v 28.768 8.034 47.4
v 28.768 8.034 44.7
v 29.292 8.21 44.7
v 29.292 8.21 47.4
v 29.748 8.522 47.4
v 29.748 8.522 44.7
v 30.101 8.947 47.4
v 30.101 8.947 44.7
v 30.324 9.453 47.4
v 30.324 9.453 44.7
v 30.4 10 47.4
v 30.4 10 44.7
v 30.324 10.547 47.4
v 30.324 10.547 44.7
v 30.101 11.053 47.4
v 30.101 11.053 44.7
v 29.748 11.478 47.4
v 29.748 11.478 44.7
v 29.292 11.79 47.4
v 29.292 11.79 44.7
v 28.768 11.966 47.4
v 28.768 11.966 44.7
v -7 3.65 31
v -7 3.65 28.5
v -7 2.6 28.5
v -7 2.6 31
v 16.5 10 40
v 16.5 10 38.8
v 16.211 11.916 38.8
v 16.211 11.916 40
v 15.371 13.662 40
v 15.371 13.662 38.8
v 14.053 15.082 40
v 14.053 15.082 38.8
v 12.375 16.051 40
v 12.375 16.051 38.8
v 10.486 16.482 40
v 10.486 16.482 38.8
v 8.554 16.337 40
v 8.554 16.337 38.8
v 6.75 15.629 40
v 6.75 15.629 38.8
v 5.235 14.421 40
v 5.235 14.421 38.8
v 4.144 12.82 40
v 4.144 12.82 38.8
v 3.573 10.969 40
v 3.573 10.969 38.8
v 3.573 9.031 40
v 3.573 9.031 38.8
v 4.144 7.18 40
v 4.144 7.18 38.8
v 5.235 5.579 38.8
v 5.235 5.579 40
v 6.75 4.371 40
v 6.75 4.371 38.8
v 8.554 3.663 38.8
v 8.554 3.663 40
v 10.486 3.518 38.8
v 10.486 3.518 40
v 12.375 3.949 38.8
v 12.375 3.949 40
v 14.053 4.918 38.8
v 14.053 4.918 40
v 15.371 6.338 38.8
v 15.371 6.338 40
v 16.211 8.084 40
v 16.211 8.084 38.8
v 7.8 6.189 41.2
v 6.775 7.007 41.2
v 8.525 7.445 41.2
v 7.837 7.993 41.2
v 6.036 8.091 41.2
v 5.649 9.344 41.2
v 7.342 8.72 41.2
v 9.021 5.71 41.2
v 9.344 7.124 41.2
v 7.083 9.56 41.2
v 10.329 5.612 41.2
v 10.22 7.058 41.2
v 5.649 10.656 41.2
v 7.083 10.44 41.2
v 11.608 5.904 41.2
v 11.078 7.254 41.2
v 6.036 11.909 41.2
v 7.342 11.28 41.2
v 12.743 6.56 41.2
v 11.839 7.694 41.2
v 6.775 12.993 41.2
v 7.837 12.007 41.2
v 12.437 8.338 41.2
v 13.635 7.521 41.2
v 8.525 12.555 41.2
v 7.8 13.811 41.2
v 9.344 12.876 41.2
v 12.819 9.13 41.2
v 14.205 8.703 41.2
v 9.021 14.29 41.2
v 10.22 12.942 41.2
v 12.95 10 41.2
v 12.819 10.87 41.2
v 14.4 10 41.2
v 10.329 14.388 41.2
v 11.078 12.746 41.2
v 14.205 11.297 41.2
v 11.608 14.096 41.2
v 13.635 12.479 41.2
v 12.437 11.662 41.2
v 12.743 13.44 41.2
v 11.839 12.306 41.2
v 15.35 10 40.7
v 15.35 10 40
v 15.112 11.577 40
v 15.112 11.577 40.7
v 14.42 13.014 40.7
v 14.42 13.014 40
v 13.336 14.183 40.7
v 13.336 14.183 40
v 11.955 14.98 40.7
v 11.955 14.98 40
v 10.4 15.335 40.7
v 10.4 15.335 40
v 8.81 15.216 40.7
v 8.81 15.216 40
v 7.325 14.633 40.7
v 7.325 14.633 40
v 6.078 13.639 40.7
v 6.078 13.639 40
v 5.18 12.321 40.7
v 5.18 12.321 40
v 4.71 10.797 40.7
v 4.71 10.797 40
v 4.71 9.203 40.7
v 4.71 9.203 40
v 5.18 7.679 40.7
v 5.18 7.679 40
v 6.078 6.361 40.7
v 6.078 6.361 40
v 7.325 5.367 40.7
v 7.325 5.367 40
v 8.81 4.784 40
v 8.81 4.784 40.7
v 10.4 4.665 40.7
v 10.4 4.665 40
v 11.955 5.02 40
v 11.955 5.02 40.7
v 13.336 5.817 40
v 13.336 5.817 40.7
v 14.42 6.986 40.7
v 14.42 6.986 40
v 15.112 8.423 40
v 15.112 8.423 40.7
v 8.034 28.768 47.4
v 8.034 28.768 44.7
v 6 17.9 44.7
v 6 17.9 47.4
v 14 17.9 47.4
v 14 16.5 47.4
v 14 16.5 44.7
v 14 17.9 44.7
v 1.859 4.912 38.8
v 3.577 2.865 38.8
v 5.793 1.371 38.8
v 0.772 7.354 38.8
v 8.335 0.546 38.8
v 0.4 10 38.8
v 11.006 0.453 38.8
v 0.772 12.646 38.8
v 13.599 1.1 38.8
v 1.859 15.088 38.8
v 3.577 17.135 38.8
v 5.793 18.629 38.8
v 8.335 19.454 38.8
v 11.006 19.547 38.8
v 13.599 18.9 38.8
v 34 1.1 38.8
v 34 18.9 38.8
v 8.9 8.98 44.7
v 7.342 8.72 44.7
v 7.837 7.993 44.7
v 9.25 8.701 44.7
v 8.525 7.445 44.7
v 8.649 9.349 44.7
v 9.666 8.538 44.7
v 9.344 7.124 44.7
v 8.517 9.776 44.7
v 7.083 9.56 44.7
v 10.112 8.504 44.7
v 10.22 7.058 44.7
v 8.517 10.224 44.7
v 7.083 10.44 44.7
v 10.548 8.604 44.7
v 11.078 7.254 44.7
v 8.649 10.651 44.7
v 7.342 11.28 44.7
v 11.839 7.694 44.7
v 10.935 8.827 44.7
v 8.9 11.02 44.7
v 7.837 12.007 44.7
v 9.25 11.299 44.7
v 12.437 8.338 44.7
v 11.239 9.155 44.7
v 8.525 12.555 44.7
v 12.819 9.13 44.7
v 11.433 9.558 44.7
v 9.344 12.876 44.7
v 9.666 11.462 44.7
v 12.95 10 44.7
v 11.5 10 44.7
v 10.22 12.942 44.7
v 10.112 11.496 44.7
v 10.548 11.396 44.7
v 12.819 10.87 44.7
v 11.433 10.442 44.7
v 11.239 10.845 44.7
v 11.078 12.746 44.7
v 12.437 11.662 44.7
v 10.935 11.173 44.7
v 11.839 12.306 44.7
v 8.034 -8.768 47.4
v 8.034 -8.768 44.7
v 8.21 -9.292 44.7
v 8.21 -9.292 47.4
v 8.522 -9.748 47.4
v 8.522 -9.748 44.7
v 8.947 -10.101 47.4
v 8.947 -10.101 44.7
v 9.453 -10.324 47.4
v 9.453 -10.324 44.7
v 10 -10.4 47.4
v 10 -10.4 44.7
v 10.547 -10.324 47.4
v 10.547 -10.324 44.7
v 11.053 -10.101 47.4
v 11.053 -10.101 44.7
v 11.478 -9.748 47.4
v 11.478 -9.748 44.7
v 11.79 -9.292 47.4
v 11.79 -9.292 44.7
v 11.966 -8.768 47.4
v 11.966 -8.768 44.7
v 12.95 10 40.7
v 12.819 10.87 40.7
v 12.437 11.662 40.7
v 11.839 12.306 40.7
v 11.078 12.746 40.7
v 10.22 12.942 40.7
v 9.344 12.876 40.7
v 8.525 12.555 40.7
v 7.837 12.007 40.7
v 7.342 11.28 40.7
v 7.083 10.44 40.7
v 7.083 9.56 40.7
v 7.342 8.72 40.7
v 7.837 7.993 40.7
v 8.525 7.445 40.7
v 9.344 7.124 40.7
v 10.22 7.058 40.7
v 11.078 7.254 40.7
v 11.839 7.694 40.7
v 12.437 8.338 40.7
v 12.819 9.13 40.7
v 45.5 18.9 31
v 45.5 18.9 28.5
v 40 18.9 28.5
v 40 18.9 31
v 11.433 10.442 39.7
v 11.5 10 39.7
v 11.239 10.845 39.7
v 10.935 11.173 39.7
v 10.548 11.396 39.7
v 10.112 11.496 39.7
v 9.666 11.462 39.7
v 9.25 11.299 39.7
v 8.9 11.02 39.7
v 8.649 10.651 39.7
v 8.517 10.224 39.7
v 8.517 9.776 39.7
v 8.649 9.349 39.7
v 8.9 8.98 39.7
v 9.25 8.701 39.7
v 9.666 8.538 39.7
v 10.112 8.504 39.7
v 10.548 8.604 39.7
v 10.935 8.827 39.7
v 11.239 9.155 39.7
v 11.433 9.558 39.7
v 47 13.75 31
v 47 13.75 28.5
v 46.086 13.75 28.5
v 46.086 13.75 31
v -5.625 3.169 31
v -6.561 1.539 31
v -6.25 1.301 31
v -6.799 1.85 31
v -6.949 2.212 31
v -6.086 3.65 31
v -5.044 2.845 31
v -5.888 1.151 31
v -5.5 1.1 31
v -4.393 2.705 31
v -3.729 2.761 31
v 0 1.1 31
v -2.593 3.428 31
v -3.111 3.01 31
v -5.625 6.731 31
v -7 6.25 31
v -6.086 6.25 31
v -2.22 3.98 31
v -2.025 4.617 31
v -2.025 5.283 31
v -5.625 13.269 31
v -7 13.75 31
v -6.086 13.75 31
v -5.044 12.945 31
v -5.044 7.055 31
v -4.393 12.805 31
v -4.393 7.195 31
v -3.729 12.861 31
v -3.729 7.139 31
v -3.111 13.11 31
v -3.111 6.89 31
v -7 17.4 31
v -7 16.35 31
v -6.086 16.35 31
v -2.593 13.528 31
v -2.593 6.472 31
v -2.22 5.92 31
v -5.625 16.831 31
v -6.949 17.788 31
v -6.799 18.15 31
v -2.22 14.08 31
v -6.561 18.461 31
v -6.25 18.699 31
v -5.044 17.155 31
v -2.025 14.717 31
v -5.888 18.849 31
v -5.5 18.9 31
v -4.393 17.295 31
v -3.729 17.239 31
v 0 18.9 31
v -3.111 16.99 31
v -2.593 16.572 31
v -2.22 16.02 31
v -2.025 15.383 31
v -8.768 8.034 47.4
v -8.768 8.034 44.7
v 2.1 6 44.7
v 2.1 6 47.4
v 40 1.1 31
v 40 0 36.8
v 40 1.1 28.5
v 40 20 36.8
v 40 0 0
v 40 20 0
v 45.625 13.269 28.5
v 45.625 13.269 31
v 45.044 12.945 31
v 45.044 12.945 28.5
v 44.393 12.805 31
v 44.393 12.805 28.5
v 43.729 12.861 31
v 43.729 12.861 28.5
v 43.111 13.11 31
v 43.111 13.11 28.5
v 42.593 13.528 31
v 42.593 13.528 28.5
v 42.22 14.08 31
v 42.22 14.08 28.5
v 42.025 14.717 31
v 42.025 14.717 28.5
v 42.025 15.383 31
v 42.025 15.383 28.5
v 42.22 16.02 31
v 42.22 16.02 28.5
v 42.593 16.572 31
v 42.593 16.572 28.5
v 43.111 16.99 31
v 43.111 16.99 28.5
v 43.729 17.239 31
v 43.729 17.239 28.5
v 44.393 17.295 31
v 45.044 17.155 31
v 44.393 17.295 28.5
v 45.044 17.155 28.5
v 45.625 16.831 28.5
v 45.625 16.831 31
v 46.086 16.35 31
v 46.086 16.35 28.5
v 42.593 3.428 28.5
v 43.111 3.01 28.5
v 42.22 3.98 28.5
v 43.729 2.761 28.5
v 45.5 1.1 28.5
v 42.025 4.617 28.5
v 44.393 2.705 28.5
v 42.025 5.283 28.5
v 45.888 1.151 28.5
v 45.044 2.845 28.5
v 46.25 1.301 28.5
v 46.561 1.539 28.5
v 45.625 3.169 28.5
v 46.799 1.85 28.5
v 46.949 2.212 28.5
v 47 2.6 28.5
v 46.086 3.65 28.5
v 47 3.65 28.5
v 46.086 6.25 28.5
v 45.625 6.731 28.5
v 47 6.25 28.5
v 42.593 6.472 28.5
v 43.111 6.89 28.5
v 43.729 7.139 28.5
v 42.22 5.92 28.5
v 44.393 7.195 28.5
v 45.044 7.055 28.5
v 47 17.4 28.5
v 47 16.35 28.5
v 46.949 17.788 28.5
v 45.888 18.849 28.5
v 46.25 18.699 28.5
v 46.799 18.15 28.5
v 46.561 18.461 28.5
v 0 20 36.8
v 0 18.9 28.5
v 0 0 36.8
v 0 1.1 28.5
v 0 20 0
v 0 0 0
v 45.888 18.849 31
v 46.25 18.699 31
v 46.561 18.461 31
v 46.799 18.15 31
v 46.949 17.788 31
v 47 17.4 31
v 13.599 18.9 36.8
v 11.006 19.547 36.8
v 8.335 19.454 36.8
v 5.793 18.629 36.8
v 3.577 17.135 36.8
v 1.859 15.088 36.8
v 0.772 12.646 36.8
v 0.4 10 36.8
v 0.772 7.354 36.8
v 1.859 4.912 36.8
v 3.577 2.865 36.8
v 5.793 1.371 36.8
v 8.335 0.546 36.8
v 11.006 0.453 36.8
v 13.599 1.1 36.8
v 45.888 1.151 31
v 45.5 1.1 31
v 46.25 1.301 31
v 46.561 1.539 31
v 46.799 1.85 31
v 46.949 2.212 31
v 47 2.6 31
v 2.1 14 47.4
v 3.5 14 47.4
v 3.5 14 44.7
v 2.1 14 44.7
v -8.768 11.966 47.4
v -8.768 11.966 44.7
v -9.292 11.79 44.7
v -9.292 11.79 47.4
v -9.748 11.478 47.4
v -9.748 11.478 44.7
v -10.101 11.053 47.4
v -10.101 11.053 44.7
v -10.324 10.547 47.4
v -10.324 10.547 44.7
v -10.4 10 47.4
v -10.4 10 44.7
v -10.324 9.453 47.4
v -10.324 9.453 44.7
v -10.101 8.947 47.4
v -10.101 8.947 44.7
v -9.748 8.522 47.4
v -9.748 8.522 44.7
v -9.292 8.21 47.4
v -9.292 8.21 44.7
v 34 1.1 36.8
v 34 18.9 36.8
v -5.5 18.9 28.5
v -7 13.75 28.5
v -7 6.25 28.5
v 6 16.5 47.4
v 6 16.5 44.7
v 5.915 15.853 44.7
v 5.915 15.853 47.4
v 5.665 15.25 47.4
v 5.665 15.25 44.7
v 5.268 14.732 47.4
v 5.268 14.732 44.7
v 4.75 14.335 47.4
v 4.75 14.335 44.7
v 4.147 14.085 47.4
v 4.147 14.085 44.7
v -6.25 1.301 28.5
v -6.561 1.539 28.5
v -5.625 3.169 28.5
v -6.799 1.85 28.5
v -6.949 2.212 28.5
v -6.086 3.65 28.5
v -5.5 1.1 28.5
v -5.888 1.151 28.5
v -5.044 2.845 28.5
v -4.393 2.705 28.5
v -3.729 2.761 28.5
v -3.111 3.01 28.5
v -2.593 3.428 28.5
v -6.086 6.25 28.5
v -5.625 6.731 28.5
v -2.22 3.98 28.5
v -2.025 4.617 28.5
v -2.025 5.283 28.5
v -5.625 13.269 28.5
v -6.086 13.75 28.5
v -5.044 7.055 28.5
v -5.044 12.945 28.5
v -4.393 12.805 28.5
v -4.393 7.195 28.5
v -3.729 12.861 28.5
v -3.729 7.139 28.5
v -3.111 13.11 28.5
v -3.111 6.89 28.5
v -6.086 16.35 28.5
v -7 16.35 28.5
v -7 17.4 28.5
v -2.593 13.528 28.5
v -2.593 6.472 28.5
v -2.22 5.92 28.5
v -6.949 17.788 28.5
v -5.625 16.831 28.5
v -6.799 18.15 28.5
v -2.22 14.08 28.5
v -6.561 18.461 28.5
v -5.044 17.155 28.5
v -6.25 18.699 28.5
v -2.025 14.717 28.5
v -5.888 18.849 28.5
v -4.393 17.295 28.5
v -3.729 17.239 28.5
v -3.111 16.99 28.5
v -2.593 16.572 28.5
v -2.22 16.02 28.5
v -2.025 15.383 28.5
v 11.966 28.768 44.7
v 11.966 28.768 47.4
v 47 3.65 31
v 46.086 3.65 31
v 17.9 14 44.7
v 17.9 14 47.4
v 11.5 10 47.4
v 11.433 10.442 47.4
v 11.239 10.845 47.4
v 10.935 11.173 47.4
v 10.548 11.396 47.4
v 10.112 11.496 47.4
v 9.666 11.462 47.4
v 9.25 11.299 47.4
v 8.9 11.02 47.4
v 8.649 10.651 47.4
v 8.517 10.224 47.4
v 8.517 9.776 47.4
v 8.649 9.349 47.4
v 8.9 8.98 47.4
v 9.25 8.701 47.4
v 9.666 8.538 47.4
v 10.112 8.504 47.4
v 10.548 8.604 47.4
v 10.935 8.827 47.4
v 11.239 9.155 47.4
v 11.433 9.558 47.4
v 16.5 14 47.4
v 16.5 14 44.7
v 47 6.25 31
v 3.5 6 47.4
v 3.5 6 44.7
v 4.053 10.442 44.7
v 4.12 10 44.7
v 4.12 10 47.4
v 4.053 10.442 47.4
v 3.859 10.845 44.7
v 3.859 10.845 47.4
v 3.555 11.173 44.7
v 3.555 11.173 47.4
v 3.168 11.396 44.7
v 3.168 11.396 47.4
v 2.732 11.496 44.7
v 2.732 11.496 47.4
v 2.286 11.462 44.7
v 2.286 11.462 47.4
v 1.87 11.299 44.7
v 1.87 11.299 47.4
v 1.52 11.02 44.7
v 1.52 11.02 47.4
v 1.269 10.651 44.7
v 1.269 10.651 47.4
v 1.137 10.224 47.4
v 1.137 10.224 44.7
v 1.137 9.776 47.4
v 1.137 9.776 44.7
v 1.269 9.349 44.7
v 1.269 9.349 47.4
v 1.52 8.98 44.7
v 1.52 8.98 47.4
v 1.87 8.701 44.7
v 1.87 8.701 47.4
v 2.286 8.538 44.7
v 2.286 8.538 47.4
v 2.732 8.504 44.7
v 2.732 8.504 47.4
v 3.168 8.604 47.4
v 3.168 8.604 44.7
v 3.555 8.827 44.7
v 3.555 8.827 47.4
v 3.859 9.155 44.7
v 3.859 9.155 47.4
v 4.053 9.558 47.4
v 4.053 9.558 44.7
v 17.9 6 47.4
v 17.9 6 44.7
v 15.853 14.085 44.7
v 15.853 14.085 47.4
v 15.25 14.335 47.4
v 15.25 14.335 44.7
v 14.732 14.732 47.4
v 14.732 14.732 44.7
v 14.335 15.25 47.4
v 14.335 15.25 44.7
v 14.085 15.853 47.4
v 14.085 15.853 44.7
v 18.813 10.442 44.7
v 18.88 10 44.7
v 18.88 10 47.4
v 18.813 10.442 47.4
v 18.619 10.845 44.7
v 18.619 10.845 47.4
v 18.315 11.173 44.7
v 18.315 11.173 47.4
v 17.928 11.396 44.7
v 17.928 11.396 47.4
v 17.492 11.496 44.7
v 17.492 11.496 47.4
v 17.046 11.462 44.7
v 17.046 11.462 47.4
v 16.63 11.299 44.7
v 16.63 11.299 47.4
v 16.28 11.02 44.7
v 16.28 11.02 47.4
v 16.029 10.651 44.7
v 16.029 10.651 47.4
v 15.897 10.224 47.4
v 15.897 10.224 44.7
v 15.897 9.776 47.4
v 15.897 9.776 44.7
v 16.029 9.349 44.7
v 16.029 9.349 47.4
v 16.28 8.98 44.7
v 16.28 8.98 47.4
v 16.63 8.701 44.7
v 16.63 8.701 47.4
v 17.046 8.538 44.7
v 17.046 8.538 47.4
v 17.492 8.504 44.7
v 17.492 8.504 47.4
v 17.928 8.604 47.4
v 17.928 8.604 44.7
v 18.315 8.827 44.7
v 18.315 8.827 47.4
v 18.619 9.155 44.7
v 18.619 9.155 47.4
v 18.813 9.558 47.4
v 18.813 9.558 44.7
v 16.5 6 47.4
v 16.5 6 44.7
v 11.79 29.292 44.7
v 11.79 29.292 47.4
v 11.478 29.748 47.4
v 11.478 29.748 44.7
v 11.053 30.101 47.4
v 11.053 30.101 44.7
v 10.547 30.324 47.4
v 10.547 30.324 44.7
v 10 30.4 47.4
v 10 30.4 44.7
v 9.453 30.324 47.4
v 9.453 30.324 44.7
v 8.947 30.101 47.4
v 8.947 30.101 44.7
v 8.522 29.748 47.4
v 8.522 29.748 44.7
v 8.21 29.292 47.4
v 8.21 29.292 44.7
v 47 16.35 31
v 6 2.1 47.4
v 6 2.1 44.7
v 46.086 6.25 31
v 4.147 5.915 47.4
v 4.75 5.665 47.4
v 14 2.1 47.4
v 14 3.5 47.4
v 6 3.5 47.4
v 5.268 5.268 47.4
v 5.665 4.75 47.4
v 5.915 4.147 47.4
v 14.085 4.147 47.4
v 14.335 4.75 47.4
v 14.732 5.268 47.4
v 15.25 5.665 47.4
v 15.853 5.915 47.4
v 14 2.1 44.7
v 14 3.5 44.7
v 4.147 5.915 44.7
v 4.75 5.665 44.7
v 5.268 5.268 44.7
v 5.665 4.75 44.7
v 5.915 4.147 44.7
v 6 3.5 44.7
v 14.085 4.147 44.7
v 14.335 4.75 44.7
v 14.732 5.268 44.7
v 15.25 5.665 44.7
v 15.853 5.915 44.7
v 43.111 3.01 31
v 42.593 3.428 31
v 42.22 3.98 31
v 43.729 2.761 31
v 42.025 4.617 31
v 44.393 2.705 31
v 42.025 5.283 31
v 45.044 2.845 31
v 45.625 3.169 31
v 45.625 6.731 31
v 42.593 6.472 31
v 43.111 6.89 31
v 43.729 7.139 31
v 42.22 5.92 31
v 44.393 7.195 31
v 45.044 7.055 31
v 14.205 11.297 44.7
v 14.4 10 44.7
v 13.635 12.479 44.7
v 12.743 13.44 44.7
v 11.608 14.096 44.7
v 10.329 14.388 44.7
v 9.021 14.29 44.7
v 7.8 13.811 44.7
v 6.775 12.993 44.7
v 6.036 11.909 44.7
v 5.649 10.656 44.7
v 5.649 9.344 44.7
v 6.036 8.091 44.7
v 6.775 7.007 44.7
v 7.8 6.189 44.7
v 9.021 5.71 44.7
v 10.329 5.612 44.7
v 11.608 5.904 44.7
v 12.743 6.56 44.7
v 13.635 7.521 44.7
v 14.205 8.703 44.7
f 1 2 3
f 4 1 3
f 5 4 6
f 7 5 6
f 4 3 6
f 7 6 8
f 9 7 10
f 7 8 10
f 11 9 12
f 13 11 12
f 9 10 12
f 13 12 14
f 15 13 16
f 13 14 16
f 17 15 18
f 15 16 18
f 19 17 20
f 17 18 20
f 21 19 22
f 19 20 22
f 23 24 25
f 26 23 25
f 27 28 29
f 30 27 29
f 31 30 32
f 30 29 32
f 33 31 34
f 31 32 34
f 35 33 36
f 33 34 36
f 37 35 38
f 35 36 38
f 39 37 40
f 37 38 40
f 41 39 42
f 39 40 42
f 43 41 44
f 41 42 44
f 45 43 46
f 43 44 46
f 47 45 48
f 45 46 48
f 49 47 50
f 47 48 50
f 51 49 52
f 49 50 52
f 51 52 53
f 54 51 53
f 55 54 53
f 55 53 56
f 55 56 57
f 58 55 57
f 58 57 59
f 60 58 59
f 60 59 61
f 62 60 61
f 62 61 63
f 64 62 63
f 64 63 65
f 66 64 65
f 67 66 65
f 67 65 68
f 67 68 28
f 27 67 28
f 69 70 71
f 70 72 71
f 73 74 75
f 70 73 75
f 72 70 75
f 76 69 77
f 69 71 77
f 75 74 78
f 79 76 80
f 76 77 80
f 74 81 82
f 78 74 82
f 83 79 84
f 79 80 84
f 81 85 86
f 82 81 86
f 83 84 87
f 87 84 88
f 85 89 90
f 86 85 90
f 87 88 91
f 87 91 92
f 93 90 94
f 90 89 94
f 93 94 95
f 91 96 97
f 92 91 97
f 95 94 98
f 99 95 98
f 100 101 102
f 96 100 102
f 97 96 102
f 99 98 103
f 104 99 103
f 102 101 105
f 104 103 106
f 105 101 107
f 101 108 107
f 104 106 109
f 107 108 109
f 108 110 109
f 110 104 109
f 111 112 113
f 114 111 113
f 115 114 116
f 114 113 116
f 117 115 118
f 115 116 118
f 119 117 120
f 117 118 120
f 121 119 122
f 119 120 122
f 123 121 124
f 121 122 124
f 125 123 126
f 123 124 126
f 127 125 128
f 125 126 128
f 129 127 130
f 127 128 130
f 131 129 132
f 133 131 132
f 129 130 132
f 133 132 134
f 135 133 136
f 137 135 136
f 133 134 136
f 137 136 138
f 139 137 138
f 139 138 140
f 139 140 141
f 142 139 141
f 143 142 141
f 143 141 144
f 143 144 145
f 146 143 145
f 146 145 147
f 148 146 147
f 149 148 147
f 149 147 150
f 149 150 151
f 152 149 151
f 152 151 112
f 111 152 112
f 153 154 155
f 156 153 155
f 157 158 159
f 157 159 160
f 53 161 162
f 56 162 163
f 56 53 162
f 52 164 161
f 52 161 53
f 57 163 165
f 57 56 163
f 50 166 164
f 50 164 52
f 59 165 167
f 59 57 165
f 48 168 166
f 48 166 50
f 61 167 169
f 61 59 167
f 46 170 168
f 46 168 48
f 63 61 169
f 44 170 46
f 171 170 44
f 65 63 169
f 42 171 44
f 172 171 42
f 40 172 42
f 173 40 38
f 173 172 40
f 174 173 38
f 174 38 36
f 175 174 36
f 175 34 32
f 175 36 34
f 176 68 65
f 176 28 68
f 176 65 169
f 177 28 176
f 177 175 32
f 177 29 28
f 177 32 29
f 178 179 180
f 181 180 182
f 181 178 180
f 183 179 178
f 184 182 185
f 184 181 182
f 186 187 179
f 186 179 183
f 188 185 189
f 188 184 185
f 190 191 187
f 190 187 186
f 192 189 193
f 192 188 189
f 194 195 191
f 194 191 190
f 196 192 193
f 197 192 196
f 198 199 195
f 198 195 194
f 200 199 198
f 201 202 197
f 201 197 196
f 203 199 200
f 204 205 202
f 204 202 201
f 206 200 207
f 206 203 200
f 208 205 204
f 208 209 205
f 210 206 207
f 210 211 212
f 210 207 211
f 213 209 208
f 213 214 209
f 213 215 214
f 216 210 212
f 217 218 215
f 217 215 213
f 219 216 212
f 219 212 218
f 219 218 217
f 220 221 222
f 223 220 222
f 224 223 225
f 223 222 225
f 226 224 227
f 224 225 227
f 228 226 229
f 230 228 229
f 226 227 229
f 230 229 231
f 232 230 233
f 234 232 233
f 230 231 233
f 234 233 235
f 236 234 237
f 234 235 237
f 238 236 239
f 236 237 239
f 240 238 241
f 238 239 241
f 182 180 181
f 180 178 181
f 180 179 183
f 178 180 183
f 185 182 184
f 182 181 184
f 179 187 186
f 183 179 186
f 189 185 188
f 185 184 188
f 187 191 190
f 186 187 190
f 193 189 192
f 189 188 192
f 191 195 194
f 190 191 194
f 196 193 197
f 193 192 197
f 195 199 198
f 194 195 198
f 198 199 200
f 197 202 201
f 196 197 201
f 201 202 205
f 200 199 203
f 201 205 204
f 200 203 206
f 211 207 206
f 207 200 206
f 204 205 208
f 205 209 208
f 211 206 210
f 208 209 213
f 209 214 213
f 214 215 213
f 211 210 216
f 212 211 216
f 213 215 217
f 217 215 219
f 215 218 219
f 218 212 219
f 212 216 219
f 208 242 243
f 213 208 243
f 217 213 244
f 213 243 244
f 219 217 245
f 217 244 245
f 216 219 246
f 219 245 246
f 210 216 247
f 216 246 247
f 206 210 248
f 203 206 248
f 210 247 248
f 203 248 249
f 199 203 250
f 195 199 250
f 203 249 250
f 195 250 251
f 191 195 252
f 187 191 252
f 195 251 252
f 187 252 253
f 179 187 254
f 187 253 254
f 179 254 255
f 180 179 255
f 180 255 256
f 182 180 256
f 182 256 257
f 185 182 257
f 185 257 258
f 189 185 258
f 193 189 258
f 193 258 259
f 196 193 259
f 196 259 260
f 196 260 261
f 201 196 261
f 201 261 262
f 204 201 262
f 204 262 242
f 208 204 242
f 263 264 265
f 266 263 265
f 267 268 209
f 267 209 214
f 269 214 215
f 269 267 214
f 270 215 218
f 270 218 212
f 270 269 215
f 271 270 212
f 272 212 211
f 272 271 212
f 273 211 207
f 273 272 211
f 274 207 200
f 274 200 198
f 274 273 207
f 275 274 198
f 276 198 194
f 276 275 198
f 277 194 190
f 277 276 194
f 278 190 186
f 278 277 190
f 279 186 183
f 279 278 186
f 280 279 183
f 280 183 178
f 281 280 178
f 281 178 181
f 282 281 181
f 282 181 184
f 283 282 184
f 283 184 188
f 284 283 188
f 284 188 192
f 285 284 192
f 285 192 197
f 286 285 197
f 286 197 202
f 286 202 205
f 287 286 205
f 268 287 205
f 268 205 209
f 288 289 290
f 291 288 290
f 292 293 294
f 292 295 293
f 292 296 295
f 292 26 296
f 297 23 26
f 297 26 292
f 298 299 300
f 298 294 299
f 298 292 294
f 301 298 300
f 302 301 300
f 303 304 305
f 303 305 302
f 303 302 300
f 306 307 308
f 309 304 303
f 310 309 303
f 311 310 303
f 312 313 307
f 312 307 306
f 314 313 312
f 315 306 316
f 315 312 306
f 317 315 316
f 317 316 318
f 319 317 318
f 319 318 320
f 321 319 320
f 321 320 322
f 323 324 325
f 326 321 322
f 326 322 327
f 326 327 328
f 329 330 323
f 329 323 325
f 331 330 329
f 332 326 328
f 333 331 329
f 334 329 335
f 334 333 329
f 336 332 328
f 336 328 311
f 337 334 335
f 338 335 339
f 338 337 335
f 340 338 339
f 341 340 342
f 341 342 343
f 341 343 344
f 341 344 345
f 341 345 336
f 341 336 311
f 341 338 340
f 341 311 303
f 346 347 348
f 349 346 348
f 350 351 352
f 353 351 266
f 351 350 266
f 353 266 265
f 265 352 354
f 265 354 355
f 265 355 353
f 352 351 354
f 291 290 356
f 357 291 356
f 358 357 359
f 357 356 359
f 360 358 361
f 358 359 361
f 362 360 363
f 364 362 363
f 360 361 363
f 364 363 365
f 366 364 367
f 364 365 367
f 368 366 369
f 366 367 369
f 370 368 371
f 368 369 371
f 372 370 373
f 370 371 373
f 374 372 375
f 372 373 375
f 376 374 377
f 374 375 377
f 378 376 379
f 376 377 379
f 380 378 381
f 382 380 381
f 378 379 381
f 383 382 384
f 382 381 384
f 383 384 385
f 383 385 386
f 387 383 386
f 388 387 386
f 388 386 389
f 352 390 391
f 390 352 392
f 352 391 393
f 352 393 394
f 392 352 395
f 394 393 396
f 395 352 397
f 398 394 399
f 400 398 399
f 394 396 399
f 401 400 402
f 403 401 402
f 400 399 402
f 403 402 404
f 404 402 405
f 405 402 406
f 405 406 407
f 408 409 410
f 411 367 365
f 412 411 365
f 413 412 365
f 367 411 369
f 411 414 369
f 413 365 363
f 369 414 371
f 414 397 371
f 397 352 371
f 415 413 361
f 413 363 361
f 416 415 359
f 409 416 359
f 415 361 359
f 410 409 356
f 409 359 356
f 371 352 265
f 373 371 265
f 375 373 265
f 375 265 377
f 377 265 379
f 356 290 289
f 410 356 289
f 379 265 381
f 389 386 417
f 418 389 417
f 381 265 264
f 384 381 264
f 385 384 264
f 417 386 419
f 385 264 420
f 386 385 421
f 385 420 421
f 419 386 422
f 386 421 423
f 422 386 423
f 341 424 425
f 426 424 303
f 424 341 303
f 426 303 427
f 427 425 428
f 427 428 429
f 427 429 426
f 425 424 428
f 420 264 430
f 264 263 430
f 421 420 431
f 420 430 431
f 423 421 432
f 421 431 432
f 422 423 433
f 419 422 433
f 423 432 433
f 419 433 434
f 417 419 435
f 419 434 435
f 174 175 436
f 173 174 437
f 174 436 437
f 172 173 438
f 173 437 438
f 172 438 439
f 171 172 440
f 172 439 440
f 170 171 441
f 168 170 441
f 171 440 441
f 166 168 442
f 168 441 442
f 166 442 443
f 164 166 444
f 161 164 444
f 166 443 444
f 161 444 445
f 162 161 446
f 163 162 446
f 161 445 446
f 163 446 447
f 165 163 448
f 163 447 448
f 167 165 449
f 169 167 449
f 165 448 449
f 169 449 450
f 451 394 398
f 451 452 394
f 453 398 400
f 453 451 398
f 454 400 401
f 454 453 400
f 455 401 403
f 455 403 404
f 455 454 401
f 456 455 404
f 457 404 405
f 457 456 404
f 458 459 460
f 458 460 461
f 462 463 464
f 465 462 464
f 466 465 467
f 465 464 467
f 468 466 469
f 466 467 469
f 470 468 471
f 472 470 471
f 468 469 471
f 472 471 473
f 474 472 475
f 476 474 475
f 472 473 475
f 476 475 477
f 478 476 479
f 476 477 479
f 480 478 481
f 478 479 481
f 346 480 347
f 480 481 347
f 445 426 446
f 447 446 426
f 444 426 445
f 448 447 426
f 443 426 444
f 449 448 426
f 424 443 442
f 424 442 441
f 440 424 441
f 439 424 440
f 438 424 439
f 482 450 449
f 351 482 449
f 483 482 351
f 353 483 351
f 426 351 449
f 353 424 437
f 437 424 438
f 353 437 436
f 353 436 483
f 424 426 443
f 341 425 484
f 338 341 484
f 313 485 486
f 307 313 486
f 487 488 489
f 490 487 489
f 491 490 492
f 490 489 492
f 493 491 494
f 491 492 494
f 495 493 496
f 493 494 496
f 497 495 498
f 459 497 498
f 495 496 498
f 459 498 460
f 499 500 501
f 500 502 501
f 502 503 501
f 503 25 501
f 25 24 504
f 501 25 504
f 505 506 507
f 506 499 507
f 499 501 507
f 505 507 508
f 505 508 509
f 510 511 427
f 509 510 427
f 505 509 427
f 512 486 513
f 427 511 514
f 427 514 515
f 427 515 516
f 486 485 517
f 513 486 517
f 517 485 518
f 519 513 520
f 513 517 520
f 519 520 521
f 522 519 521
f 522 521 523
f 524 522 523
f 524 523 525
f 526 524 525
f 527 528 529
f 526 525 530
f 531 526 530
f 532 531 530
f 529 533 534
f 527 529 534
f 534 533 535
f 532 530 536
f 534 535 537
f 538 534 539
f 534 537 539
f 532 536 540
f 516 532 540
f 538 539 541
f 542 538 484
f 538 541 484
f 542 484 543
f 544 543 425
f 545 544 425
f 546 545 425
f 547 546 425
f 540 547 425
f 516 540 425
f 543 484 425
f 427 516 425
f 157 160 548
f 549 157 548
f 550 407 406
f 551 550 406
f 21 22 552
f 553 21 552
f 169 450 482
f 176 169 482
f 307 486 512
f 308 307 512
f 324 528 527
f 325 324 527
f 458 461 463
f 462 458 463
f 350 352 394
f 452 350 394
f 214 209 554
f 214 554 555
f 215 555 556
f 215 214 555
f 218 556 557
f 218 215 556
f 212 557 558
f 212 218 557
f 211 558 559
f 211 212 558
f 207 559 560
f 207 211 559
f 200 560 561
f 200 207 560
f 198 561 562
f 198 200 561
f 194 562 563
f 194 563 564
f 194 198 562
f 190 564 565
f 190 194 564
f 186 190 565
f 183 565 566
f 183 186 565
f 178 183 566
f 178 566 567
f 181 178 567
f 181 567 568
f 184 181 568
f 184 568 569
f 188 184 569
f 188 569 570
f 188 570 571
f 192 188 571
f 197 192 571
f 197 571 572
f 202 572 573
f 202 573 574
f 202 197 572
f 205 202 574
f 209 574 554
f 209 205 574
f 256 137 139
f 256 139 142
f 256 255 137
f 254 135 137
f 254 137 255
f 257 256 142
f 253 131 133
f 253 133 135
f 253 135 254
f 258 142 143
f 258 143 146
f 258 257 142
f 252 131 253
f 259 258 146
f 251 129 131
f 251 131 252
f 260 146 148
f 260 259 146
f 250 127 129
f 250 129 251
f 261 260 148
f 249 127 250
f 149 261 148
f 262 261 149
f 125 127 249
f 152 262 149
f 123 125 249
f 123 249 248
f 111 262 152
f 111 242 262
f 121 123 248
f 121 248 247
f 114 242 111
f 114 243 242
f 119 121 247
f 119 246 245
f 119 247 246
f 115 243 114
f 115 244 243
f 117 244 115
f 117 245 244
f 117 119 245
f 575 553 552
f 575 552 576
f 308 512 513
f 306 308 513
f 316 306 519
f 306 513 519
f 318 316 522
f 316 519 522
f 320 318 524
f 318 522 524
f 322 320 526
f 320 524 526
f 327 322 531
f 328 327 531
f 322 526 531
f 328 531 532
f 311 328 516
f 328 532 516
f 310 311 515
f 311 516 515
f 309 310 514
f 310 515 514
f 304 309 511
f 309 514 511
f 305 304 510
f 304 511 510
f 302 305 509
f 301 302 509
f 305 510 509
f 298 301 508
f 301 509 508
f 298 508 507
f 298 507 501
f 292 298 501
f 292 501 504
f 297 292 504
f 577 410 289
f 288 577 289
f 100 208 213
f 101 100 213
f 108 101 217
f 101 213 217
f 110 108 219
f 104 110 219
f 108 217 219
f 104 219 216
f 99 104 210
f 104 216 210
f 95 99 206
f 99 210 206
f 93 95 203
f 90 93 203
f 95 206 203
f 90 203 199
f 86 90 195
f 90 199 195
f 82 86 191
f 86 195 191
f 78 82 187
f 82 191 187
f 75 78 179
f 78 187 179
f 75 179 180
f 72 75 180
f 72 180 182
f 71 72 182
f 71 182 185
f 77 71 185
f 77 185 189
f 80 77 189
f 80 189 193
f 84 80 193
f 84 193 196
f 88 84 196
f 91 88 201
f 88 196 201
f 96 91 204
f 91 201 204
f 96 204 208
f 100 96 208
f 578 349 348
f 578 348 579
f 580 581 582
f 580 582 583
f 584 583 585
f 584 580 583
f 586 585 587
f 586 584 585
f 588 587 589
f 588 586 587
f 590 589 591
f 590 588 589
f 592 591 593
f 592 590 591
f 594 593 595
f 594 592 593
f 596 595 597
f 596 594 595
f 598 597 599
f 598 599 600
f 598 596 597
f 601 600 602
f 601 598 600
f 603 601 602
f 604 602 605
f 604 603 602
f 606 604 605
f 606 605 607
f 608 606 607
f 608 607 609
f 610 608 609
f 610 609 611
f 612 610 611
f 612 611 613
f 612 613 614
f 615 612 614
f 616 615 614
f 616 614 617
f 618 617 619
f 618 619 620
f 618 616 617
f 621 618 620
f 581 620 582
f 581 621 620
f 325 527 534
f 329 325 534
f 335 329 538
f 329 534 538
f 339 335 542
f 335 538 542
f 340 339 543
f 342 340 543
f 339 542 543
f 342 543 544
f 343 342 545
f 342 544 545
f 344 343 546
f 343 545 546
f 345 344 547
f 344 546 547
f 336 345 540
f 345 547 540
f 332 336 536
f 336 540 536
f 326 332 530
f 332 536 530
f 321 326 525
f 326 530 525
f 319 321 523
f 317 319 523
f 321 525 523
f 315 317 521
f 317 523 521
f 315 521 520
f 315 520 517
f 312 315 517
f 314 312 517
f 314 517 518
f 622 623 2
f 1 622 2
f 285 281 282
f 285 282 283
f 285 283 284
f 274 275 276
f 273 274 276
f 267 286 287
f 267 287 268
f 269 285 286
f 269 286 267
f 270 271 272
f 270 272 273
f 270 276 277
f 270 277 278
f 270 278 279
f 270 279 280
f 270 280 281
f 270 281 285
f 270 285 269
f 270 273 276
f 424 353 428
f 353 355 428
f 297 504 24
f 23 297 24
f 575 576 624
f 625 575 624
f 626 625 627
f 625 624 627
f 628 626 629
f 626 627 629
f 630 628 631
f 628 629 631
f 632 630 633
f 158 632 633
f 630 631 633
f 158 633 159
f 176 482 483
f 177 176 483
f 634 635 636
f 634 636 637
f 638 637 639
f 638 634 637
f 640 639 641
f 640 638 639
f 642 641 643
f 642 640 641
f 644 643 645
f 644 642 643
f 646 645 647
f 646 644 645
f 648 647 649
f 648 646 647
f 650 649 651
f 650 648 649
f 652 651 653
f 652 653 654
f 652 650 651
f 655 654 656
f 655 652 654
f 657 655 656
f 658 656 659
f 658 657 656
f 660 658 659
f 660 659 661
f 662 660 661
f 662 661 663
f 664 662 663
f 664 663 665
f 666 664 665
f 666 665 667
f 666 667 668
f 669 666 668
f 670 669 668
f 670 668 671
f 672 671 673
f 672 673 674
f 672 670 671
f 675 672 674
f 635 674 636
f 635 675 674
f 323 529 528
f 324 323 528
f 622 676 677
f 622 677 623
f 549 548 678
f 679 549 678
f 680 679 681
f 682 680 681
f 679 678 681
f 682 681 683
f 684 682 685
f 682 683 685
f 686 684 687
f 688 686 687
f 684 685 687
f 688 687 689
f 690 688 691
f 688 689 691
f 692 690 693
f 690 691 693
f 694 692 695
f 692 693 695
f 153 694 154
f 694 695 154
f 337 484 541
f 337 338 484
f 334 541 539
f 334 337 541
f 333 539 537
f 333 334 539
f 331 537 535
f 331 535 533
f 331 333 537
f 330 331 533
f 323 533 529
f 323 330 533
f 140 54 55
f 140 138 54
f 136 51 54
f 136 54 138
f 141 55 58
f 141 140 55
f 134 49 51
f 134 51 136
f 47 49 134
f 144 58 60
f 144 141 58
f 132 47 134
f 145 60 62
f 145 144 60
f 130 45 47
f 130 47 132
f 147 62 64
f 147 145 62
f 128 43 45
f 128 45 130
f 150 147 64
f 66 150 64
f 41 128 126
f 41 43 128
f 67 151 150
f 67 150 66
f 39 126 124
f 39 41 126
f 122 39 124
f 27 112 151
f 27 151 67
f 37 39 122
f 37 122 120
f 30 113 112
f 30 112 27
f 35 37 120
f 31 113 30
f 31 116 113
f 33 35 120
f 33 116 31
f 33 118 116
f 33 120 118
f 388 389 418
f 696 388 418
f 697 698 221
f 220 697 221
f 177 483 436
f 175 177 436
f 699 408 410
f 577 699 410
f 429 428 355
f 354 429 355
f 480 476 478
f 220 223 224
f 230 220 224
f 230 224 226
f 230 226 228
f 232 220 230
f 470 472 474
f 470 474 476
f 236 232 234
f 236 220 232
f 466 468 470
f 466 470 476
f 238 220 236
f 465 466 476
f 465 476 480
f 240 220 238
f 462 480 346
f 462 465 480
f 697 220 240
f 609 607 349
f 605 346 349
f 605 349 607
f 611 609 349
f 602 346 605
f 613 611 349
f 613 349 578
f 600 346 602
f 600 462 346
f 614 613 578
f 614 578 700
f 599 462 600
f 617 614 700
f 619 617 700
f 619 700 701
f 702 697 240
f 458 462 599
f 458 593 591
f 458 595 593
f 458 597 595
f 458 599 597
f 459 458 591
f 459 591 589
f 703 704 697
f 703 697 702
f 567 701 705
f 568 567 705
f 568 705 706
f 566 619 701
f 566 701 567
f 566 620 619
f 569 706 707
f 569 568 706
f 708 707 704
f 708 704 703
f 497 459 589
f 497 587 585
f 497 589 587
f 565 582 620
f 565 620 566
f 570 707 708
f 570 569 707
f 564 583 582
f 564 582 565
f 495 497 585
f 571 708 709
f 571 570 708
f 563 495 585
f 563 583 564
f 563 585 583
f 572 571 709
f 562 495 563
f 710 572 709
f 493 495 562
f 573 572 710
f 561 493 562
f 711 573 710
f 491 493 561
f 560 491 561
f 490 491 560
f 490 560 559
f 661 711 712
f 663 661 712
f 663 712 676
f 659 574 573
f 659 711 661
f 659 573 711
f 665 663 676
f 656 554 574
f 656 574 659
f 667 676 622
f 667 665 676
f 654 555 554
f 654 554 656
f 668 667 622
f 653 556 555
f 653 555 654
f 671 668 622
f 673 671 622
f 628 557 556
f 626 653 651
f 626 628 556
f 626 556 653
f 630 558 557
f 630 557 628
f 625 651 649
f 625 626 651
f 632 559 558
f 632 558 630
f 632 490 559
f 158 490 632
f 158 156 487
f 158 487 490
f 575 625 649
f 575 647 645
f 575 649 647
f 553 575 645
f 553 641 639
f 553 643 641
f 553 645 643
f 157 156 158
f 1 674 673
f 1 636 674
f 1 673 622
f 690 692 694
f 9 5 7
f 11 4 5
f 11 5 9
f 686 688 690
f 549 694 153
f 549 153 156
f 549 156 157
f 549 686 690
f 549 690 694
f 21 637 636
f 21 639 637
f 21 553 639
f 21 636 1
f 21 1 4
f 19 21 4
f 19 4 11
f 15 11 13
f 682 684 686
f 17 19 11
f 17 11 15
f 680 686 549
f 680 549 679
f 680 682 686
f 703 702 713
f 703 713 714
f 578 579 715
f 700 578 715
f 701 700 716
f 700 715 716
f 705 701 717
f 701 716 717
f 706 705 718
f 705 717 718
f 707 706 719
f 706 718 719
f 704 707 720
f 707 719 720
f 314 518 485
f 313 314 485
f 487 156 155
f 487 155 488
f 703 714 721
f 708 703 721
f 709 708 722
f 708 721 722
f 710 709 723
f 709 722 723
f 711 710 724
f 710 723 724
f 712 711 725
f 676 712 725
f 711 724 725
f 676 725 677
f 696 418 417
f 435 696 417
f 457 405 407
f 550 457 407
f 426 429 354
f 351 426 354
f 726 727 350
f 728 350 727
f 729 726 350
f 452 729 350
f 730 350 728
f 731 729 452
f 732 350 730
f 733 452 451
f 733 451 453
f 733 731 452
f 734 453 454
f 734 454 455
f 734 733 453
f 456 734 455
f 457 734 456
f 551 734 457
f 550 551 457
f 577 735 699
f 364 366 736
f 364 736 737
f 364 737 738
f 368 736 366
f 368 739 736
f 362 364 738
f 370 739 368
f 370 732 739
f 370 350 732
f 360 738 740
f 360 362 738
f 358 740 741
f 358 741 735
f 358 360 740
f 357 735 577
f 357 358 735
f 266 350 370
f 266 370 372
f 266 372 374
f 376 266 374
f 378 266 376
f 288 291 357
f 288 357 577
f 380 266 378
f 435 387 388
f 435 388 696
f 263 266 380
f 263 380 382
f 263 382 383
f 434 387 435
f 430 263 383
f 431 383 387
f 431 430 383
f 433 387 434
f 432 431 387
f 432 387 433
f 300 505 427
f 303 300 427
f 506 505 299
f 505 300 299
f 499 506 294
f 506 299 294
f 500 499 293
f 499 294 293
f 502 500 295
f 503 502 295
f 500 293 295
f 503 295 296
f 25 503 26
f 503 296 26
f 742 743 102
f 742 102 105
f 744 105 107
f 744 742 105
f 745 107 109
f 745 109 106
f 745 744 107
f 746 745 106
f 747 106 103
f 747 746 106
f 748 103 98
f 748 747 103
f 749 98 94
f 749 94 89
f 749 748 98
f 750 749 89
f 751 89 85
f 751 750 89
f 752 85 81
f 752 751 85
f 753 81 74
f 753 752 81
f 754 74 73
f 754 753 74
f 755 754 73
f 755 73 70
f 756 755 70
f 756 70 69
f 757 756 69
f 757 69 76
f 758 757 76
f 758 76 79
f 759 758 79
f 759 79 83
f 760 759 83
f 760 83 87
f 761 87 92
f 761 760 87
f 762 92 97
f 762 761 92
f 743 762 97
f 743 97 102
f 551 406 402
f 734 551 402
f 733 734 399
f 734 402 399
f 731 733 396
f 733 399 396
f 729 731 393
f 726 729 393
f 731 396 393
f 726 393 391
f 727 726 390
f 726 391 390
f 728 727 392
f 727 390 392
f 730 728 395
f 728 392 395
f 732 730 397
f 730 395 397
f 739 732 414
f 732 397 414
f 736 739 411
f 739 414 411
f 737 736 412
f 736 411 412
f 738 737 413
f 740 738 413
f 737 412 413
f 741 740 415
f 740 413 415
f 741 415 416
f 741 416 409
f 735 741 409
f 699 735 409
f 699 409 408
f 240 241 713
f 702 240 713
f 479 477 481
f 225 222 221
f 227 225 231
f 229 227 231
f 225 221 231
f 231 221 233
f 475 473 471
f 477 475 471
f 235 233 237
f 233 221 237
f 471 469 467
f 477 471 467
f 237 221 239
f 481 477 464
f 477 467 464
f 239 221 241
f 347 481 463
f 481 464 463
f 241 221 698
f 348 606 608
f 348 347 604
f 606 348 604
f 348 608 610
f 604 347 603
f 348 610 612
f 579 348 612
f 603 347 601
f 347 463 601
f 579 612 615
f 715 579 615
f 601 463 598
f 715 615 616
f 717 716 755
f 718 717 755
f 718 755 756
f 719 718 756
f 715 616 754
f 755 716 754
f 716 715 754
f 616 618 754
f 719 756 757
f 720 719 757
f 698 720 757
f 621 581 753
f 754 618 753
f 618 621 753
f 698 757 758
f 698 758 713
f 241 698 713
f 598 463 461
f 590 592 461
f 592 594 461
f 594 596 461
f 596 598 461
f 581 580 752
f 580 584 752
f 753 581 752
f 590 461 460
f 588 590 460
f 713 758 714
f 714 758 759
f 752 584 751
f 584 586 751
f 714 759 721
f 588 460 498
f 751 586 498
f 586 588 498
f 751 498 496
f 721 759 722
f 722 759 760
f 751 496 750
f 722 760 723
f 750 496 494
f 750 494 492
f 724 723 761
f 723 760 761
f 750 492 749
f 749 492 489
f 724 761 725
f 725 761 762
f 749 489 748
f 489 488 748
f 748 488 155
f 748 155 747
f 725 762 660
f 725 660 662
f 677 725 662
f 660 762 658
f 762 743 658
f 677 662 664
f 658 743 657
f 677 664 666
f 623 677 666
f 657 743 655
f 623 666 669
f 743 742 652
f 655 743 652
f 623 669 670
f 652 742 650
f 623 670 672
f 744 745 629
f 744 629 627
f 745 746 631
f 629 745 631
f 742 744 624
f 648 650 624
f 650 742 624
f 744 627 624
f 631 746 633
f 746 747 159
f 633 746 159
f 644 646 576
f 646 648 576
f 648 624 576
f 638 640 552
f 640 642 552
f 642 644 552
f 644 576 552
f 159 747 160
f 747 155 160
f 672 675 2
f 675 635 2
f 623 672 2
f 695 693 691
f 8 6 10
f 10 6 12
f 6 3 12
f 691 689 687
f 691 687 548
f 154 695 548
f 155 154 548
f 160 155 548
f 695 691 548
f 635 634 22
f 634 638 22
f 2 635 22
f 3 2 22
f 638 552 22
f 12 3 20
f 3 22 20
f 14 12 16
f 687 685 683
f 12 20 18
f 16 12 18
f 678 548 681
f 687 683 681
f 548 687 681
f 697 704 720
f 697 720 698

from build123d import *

# Parameters (mm, degrees)
F0_W      = 40
F0_H      = 20
F1_DEPTH  = 28.5
F3_DEPTH  = 2.5
F2_R      = 2.95
F2_R_2    = 1.5
F4_DEPTH  = 16.2
F2_R_3    = 5.35
F5_DEPTH  = 12.2
F2_R_4    = 6.5
F6_DEPTH  = 11.5
F7_DEPTH  = 10.3
F8_DEPTH  = 8.3
F9_DEPTH  = 11.2
F10_R     = 1.5
F11_R     = 4.4
F11_R_2   = 2.95
F12_DEPTH = 3.5
F11_R_3   = 1.5
F13_DEPTH = 2.7


with BuildPart() as f1:
    # F0 (on Top) → F1 (new body)
    with BuildSketch(Plane.XY):
        with Locations((20, 10)):
            Rectangle(F0_W, F0_H)
    extrude(amount=F1_DEPTH)

    # F2 (on face) → F3 (join)
    with BuildSketch(Plane.XY.offset(28.5)):
        with BuildLine():
            Line((-7, 1.1), (0, 1.1))
            Line((0, 1.1), (0, 18.9))
            Line((0, 18.9), (-7, 18.9))
            Line((-7, 18.9), (-7, 16.35))
            Line((-7, 16.35), (-6.0864367672, 16.35))
            ThreePointArc((-6.0864367672, 16.35), (-2, 15.05), (-6.0864367672, 13.75))
            Line((-6.0864367672, 13.75), (-7, 13.75))
            Line((-7, 13.75), (-7, 10))
            Line((-7, 10), (-7, 6.25))
            Line((-7, 6.25), (-6.0864367672, 6.25))
            ThreePointArc((-6.0864367672, 6.25), (-2, 4.95), (-6.0864367672, 3.65))
            Line((-6.0864367672, 3.65), (-7, 3.65))
            Line((-7, 3.65), (-7, 1.1))
        make_face()
        with BuildLine():
            Line((40, 18.9), (40, 1.1))
            Line((40, 1.1), (47, 1.1))
            Line((47, 1.1), (47, 3.65))
            Line((47, 3.65), (46.0864367672, 3.65))
            ThreePointArc((46.0864367672, 3.65), (42, 4.95), (46.0864367672, 6.25))
            Line((46.0864367672, 6.25), (47, 6.25))
            Line((47, 6.25), (47, 10))
            Line((47, 10), (47, 13.75))
            Line((47, 13.75), (46.0864367672, 13.75))
            ThreePointArc((46.0864367672, 13.75), (42, 15.05), (46.0864367672, 16.35))
            Line((46.0864367672, 16.35), (47, 16.35))
            Line((47, 16.35), (47, 18.9))
            Line((47, 18.9), (40, 18.9))
        make_face()
    extrude(amount=F3_DEPTH)

    # F2 (on face) → F4 (join)
    with BuildSketch(Plane.XY.offset(28.5)):
        with Locations((10, 10)):
            Circle(F2_R)
        with Locations((10, 10)):
            Circle(F2_R_2, mode=Mode.SUBTRACT)
    extrude(amount=F4_DEPTH)

    # F2 (on face) → F5 (join)
    with BuildSketch(Plane.XY.offset(28.5)):
        with Locations((10, 10)):
            Circle(F2_R_3)
        with Locations((10, 10)):
            Circle(F2_R, mode=Mode.SUBTRACT)
    extrude(amount=F5_DEPTH)

    # F2 (on face) → F6 (join)
    with BuildSketch(Plane.XY.offset(28.5)):
        with Locations((10, 10)):
            Circle(F2_R_4)
        with Locations((10, 10)):
            Circle(F2_R_3, mode=Mode.SUBTRACT)
    extrude(amount=F6_DEPTH)

    # F2 (on face) → F7 (join)
    with BuildSketch(Plane.XY.offset(28.5)):
        with BuildLine():
            Line((34, 18.9), (13.5986108431, 18.9))
            ThreePointArc((13.5986108431, 18.9), (0.4, 10), (13.5986108431, 1.1))
            Line((13.5986108431, 1.1), (34, 1.1))
            Line((34, 1.1), (34, 18.9))
        make_face()
        with Locations((10, 10)):
            Circle(F2_R_4, mode=Mode.SUBTRACT)
    extrude(amount=F7_DEPTH)

    # F2 (on face) → F8 (join)
    with BuildSketch(Plane.XY.offset(28.5)):
        Polygon((0, 1.1), (0, 0), (40, 0), (40, 1.1), (40, 18.9), (40, 20), (20, 20), (0, 20), (0, 18.9), align=None)
        with BuildLine():
            ThreePointArc((13.5986108431, 1.1), (0.4, 10), (13.5986108431, 18.9))
            Line((13.5986108431, 18.9), (34, 18.9))
            Line((34, 18.9), (34, 1.1))
            Line((34, 1.1), (13.5986108431, 1.1))
        make_face(mode=Mode.SUBTRACT)
    extrude(amount=F8_DEPTH)

    # F2 (on face) → F9 (join)
    with BuildSketch(Plane.XY.offset(28.5)):
        with Locations((10, 10)):
            Circle(F2_R_2)
    extrude(amount=F9_DEPTH)

    # F10
    f10_edges = [f1.edges().sort_by_distance(p)[0] for p in [
        (-7, 1.1, 29.75),
        (-7, 18.9, 29.75),
        (47, 1.1, 29.75),
        (47, 18.9, 29.75),
    ]]
    fillet(f10_edges, radius=F10_R)


with BuildPart() as f12:
    # F11 (on face) → F12 (new body)
    with BuildSketch(Plane.XY.offset(44.7)):
        with Locations((10, 10)):
            Circle(F11_R)
        with Locations((10, 10)):
            Circle(F11_R_2, mode=Mode.SUBTRACT)
    extrude(amount=-F12_DEPTH)

    # F11 (on face) → F13 (join)
    with BuildSketch(Plane.XY.offset(44.7)):
        with BuildLine():
            Line((17.9, 14), (16.5, 14))
            ThreePointArc((16.5, 14), (14.732233047, 14.732233047), (14, 16.5))
            Line((14, 16.5), (14, 17.9))
            Line((14, 17.9), (11.9658623055, 28.767947545))
            ThreePointArc((11.9658623055, 28.767947545), (10, 30.4), (8.0341376945, 28.767947545))
            Line((8.0341376945, 28.767947545), (6, 17.9))
            Line((6, 17.9), (6, 16.5))
            ThreePointArc((6, 16.5), (5.267766953, 14.732233047), (3.5, 14))
            Line((3.5, 14), (2.1, 14))
            Line((2.1, 14), (-8.767947545, 11.9658623055))
            ThreePointArc((-8.767947545, 11.9658623055), (-10.4, 10), (-8.767947545, 8.0341376945))
            Line((-8.767947545, 8.0341376945), (2.1, 6))
            Line((2.1, 6), (3.5, 6))
            ThreePointArc((3.5, 6), (5.267766953, 5.267766953), (6, 3.5))
            Line((6, 3.5), (6, 2.1))
            Line((6, 2.1), (8.0341376945, -8.767947545))
            ThreePointArc((8.0341376945, -8.767947545), (10, -10.4), (11.9658623055, -8.767947545))
            Line((11.9658623055, -8.767947545), (14, 2.1))
            Line((14, 2.1), (14, 3.5))
            ThreePointArc((14, 3.5), (14.732233047, 5.267766953), (16.5, 6))
            Line((16.5, 6), (17.9, 6))
            Line((17.9, 6), (28.767947545, 8.0341376945))
            ThreePointArc((28.767947545, 8.0341376945), (30.4, 10), (28.767947545, 11.9658623055))
            Line((28.767947545, 11.9658623055), (17.9, 14))
        make_face()
        with Locations((2.62, 10)):
            Circle(F11_R_3, mode=Mode.SUBTRACT)
        with Locations((10, 10)):
            Circle(F11_R, mode=Mode.SUBTRACT)
        with Locations((17.38, 10)):
            Circle(F11_R_3, mode=Mode.SUBTRACT)
        with Locations((10, 10)):
            Circle(F11_R)
        with Locations((10, 10)):
            Circle(F11_R_2, mode=Mode.SUBTRACT)
        with Locations((10, 10)):
            Circle(F11_R_2)
        with Locations((10, 10)):
            Circle(F11_R_3, mode=Mode.SUBTRACT)
    extrude(amount=F13_DEPTH)


solid = Compound([f1.part, f12.part])
